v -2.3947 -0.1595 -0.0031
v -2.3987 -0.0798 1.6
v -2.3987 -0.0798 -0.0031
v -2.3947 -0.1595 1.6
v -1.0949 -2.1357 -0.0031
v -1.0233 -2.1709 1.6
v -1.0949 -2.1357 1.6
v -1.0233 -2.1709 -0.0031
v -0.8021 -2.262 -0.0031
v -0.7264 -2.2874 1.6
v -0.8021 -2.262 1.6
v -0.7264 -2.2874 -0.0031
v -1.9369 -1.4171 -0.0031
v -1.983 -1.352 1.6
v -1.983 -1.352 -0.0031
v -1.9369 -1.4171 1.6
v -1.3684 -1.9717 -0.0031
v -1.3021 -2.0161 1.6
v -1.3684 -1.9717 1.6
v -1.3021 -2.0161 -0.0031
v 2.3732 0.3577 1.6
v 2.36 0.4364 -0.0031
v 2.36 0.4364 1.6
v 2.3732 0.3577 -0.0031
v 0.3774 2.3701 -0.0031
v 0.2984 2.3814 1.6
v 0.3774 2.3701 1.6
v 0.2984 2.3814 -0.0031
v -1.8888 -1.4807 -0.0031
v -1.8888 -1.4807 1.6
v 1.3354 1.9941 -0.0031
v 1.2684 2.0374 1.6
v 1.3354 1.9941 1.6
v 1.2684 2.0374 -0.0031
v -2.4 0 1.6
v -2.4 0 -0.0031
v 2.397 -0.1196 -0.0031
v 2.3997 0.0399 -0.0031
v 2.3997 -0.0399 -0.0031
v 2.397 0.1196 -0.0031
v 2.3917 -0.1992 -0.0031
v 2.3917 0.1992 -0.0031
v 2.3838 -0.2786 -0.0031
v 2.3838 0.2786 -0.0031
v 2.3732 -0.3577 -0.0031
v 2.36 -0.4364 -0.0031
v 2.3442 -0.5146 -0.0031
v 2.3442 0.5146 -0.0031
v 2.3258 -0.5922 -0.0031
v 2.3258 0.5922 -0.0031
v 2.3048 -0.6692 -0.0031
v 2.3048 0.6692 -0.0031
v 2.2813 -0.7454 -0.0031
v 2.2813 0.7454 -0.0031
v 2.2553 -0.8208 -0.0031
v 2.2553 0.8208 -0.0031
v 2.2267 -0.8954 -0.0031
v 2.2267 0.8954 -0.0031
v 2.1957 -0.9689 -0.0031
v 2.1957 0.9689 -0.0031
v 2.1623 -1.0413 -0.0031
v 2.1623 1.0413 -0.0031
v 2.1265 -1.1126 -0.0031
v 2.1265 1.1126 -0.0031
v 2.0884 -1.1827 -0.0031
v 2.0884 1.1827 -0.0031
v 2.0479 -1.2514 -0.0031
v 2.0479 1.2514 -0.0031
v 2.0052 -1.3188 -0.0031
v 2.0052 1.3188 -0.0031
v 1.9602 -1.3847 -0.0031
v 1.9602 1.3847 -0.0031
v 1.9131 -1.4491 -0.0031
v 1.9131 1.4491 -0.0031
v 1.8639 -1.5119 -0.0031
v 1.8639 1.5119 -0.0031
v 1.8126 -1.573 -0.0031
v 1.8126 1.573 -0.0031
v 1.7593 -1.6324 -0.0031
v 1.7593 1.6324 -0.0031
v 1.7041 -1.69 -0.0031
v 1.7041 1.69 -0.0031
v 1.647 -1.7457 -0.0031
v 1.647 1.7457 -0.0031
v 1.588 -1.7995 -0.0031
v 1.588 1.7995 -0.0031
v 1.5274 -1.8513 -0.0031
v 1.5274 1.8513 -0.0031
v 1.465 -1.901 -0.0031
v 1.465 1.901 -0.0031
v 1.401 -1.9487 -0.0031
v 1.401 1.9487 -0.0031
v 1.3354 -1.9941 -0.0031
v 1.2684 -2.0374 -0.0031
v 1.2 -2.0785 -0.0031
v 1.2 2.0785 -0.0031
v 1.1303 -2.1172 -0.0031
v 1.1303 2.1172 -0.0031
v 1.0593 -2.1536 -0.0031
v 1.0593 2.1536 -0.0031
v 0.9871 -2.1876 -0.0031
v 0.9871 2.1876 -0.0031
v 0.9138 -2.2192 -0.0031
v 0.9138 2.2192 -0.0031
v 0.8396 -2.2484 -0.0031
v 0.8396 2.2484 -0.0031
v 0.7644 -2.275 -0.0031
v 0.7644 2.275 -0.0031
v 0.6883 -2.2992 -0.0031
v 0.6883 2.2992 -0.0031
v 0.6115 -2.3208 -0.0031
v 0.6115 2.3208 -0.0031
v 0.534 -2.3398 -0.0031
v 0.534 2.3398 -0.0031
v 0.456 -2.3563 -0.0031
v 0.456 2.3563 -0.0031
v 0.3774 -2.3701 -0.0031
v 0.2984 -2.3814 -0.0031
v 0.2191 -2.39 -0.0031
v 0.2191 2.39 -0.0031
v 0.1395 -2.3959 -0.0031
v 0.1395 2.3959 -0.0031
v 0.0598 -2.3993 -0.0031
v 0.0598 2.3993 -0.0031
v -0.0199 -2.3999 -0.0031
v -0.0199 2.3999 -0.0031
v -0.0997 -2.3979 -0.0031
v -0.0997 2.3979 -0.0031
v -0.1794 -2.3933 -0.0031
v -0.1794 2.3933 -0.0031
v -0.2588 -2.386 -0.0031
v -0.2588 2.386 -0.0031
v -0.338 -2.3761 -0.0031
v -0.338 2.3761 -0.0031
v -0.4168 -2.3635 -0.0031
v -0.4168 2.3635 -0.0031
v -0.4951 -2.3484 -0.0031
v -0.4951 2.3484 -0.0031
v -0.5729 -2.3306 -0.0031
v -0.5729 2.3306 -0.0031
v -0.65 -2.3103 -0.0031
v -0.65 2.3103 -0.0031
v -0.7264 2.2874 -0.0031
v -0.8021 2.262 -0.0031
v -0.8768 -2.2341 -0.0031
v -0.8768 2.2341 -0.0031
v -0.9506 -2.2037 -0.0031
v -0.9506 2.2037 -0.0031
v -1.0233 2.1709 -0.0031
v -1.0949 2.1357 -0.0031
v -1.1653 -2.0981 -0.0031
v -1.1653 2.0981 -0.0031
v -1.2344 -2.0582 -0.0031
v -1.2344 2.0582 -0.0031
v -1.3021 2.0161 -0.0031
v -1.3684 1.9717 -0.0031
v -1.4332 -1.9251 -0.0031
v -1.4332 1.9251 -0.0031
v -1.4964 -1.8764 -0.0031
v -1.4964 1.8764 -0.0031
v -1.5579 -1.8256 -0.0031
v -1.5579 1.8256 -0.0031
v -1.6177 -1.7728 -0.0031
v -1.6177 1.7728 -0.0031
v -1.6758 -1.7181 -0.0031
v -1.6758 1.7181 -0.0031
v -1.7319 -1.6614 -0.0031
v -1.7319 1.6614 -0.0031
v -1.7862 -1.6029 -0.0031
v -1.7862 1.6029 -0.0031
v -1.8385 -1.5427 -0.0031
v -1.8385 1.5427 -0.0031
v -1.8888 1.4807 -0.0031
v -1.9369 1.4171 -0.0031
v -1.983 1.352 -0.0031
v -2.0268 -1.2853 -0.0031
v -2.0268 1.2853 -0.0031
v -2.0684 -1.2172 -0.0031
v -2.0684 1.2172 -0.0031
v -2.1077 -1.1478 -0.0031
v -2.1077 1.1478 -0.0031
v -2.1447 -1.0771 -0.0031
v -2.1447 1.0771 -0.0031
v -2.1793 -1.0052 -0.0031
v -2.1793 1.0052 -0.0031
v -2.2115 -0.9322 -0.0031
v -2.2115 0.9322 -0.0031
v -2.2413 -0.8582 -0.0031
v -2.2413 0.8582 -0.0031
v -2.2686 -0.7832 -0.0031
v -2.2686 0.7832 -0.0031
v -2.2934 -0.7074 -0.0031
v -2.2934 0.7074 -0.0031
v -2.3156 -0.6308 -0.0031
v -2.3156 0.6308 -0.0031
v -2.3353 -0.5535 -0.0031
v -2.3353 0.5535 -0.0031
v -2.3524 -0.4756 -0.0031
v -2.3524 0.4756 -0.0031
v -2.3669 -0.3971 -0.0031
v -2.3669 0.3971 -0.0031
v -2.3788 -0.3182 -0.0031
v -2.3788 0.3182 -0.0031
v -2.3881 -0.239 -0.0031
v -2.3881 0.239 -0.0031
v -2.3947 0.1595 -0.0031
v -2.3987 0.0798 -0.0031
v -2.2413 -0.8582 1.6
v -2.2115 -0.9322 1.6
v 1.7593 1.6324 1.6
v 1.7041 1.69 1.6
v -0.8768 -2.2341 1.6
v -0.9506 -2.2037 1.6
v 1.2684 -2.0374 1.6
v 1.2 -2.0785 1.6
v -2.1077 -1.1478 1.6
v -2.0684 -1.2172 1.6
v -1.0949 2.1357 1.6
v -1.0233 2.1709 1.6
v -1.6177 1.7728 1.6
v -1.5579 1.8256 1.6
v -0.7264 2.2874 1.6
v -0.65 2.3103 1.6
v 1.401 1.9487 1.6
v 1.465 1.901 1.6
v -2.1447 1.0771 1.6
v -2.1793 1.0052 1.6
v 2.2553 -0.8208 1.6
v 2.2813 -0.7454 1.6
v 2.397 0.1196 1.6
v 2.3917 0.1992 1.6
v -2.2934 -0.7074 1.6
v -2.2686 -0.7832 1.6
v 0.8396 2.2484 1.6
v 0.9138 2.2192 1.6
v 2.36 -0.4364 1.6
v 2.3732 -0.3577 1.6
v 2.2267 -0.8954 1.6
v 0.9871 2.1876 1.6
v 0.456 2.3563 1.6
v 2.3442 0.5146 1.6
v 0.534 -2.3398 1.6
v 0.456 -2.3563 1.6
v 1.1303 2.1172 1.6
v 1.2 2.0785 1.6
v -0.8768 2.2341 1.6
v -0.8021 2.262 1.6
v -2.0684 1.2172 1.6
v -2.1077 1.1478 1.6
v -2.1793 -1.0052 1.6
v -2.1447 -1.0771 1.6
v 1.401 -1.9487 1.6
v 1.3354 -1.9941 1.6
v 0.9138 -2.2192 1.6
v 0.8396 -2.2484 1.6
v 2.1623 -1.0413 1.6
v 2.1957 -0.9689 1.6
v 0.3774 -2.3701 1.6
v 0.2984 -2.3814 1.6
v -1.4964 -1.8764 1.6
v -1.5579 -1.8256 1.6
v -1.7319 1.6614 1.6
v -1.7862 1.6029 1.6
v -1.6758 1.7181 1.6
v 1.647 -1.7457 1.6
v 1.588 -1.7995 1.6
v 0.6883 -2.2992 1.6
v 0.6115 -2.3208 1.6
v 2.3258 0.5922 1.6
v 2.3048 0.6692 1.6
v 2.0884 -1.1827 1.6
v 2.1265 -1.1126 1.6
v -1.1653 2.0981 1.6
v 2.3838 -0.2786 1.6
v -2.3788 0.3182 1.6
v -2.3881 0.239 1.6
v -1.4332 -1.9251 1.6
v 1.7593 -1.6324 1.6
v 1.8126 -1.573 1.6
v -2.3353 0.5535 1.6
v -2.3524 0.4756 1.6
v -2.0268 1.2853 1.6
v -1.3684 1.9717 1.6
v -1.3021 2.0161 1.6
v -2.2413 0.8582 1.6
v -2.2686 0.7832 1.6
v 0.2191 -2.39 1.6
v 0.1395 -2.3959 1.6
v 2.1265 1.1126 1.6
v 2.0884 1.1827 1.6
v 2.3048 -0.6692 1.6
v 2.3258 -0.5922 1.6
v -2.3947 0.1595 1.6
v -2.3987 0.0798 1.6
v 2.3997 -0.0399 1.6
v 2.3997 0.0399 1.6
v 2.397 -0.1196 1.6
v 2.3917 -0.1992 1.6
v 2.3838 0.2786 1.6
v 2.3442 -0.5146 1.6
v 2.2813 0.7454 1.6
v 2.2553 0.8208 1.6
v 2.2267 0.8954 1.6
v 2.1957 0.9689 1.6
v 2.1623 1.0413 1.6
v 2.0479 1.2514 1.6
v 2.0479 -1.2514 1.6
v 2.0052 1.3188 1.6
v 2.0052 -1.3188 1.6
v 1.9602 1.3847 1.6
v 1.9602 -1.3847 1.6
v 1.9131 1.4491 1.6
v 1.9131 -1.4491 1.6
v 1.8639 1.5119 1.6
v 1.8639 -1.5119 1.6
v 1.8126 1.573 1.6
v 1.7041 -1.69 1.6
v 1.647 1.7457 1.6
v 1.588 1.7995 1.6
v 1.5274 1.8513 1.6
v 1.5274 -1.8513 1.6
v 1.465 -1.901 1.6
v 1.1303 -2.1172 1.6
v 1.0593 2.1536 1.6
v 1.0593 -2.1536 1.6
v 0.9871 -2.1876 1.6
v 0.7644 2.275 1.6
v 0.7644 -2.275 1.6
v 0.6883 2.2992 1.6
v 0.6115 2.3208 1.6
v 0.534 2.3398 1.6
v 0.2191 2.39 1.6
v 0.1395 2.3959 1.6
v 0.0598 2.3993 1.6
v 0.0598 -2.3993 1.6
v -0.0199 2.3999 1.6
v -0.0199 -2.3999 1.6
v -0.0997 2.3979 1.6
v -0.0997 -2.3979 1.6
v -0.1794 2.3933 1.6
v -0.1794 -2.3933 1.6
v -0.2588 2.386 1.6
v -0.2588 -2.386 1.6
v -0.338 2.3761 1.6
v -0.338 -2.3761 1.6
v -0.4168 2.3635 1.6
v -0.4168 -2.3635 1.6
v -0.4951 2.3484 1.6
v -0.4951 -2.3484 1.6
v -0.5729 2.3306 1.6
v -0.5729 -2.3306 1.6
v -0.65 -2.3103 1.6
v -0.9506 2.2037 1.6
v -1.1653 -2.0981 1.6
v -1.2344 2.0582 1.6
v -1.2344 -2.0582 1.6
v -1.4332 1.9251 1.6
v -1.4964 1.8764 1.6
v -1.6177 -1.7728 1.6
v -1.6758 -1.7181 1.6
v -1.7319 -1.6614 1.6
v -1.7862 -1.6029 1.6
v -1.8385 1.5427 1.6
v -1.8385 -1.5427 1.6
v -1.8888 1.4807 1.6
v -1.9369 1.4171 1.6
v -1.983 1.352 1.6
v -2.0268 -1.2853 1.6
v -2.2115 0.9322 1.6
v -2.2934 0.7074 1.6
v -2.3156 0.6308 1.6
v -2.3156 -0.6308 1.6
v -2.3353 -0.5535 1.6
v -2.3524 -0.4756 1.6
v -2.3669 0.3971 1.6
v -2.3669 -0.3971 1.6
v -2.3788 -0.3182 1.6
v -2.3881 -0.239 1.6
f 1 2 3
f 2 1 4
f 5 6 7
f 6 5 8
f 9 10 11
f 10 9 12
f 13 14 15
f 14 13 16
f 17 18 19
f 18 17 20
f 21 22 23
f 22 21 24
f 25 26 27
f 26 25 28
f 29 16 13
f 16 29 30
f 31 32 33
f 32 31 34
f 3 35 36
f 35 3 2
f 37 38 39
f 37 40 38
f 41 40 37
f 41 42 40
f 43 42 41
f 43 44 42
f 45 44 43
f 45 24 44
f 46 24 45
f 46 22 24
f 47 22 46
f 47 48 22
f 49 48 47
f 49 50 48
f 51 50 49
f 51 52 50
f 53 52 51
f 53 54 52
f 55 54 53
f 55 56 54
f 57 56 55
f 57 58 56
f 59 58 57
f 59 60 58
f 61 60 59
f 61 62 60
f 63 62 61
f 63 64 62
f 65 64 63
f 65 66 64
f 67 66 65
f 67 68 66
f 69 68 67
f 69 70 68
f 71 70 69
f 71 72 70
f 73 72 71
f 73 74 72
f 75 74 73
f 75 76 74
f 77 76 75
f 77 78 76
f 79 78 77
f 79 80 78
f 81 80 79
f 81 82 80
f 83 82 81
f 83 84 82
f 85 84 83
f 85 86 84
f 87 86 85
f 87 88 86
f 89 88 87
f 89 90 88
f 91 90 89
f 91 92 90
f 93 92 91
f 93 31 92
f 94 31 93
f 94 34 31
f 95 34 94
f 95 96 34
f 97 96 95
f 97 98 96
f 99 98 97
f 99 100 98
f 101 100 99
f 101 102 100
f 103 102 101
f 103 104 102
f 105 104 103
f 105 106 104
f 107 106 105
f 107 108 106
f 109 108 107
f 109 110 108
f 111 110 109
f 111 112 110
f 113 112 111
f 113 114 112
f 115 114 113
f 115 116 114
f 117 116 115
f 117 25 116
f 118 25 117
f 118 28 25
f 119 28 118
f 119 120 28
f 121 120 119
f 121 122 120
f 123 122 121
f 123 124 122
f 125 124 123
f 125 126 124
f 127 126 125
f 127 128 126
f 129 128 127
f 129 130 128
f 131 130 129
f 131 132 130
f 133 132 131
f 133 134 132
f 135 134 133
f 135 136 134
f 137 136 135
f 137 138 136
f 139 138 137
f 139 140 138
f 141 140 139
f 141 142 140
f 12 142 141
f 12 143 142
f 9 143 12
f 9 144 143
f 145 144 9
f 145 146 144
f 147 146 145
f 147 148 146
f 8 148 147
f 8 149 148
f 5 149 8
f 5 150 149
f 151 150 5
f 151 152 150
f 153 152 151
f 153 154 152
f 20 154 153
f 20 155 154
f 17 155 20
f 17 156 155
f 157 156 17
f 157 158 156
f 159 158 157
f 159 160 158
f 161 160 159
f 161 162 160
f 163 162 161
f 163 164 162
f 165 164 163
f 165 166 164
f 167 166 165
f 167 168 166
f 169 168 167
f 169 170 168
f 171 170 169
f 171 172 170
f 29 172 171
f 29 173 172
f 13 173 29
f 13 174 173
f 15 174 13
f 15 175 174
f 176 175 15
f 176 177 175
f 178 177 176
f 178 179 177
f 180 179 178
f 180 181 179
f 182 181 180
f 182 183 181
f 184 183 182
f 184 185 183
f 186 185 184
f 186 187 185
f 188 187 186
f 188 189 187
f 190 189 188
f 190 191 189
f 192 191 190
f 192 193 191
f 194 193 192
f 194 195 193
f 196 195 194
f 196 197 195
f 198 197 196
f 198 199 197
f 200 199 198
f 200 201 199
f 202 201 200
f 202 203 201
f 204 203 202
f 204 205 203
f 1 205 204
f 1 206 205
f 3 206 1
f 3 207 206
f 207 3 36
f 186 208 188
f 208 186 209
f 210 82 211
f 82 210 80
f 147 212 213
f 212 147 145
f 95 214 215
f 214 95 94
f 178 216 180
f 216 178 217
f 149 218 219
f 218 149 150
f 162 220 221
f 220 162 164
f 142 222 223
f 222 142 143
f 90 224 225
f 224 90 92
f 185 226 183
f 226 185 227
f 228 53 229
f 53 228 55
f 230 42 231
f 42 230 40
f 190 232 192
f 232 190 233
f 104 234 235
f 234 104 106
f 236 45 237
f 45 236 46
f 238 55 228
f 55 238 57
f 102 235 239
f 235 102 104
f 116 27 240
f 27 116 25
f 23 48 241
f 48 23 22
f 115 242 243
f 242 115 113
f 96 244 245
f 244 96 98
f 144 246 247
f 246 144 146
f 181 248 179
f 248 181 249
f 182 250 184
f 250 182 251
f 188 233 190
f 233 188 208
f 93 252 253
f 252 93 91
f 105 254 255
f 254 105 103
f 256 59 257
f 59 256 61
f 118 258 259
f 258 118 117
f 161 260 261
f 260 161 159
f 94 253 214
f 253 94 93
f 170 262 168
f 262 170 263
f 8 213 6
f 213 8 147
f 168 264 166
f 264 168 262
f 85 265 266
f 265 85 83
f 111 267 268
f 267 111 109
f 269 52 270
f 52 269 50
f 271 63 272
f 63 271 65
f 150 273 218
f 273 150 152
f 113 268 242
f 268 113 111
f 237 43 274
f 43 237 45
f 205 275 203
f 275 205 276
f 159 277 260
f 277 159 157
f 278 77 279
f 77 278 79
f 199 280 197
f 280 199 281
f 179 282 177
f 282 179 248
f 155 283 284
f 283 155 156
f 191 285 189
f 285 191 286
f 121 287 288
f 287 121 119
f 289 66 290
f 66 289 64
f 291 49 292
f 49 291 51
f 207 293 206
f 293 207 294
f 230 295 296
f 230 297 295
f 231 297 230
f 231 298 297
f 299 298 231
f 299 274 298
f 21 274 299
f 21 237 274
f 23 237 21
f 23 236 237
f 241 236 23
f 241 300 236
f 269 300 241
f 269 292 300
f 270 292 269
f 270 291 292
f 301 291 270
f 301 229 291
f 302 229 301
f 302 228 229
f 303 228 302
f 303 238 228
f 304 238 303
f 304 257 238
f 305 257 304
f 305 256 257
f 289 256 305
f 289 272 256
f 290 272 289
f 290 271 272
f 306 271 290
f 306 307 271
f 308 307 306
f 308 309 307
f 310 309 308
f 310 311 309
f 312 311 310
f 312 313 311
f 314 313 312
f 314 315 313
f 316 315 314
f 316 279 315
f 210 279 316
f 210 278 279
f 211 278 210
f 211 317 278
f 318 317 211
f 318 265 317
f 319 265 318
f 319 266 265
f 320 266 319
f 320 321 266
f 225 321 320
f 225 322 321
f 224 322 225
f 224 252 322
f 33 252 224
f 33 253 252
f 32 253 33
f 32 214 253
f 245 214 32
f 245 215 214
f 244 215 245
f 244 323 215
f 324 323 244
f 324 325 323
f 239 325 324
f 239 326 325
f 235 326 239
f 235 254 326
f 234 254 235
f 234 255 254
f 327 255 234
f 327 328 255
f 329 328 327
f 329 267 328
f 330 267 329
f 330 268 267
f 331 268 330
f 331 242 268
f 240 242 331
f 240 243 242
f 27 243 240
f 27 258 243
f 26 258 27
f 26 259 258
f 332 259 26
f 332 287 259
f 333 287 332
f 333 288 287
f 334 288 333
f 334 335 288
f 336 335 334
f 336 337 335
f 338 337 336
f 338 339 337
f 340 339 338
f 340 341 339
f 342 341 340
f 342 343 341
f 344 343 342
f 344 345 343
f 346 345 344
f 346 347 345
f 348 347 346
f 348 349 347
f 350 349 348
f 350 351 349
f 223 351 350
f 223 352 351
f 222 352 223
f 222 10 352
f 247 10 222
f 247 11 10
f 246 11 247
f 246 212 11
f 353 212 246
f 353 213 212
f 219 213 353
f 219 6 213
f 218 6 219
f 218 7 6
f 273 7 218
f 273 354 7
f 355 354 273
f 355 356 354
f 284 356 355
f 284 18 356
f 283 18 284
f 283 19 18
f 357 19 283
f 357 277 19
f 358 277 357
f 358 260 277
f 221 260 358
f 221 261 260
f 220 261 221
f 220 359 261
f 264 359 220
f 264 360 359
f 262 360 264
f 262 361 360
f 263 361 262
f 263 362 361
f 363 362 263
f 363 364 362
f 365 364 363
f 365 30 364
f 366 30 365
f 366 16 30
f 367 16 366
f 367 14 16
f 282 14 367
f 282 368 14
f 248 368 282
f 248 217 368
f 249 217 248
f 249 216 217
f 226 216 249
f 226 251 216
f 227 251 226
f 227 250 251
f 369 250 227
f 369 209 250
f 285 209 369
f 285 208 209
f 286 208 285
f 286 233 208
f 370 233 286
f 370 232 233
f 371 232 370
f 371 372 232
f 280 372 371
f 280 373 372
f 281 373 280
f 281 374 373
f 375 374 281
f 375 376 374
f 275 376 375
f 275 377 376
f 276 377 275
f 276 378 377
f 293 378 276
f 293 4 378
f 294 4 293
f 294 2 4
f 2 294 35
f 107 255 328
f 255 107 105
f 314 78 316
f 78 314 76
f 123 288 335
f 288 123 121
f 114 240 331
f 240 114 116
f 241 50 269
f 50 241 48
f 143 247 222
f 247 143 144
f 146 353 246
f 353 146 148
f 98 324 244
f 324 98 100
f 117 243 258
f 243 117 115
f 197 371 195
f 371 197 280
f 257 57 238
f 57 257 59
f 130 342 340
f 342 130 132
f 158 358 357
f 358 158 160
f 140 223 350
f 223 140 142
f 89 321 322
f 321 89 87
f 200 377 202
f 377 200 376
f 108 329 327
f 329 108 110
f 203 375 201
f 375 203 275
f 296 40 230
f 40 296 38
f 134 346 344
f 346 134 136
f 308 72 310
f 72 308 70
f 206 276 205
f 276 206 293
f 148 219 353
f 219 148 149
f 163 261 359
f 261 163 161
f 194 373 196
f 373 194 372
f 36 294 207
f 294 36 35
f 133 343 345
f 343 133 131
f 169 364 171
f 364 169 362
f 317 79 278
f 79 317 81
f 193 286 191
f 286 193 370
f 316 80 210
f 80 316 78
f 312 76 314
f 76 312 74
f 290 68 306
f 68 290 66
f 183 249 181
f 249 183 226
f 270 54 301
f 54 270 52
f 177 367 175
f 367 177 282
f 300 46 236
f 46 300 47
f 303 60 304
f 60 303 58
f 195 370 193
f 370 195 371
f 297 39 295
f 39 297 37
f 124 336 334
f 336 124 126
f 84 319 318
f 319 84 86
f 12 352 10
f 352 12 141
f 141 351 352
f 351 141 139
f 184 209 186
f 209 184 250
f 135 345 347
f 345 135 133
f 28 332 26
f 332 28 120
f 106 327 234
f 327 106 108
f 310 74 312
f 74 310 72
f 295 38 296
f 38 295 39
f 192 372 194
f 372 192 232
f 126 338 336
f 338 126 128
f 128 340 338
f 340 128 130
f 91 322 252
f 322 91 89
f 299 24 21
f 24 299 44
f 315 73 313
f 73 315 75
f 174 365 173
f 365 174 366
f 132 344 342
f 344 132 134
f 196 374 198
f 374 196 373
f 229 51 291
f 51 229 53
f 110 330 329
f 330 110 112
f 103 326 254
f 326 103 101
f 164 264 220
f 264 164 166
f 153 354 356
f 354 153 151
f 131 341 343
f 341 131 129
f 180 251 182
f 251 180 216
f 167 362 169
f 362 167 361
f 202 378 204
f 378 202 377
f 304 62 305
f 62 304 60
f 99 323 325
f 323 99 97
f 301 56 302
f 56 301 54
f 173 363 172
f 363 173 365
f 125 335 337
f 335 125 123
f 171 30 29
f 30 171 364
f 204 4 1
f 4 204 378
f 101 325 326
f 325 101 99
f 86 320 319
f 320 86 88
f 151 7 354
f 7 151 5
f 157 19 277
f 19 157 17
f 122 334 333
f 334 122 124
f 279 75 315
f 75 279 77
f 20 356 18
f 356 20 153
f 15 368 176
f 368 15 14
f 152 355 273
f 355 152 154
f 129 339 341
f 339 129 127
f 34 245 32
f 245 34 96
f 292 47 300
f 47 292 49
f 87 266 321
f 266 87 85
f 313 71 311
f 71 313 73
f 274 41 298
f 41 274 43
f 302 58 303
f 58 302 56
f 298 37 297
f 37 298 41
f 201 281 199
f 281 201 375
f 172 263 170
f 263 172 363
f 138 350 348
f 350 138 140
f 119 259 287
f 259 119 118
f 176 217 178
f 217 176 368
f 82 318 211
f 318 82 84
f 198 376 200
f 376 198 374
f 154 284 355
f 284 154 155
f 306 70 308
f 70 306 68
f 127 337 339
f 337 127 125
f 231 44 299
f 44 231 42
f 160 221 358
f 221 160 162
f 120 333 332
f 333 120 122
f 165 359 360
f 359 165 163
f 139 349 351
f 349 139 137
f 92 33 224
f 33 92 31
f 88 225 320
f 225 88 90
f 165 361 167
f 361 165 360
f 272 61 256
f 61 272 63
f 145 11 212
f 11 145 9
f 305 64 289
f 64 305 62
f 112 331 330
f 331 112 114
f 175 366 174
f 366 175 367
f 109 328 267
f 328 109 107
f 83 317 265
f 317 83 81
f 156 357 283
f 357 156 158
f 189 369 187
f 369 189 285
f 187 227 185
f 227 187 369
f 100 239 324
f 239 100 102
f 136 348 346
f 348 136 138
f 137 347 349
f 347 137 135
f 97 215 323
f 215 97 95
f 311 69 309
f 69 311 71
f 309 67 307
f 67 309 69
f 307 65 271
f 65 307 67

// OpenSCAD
// file: ../p/stud3.scad
use <../lib.scad>
use <4-4cyli.scad>
use <4-4disc.scad>
use <4-4edge.scad>
$fa=1; $fs=0.2;
function ldraw_lib__stud3(realsolid=false) = realsolid ? 
    [openscad(translate([0,0,-eps()], o=cylinder(4+eps(), r=4)),2)] : [
// 0 Stud Tube Solid
// 0 Name: stud3.dat
// 0 Author: James Jessiman
// 0 !LDRAW_ORG Primitive UPDATE 2012-01
// 0 !LICENSE Licensed under CC BY 2.0 and CC BY 4.0 : see CAreadme.txt
// 
// 0 BFC CERTIFY CCW
  [0,"BFC","CERTIFY"],
  [0,"BFC","CCW"],
// 
// 0 !HISTORY 2002-04-04 [sbliss] Modified for BFC compliance
// 0 !HISTORY 2002-04-25 [PTadmin] Official Update 2002-02
// 0 !HISTORY 2007-06-24 [PTadmin] Header formatted for Contributor Agreement
// 0 !HISTORY 2008-07-01 [PTadmin] Official Update 2008-01
// 0 !HISTORY 2012-02-16 [Philo] Changed to CCW
// 0 !HISTORY 2012-03-30 [PTadmin] Official Update 2012-01
// 
// 
// 1 16 0 -4 0 4 0 0 0 1 0 0 0 4 4-4edge.dat
  [1,16,0,-4,0,4,0,0,0,1,0,0,0,4, ldraw_lib__4_4edge(realsolid)],
// 1 16 0 0 0 4 0 0 0 1 0 0 0 4 4-4edge.dat
  [1,16,0,0,0,4,0,0,0,1,0,0,0,4, ldraw_lib__4_4edge(realsolid)],
// 1 16 0 -4 0 4 0 0 0 1 0 0 0 4 4-4disc.dat
  [1,16,0,-4,0,4,0,0,0,1,0,0,0,4, ldraw_lib__4_4disc(realsolid)],
// 1 16 0 -4 0 4 0 0 0 4 0 0 0 4 4-4cyli.dat
  [1,16,0,-4,0,4,0,0,0,4,0,0,0,4, ldraw_lib__4_4cyli(realsolid)],
];
module ldraw_lib__stud3(step=0, col=false, unit=2/5, alt=false, line=0.2, solid=!$preview)
    makepoly(ldraw_lib__stud3(solid), step=step, col=col, unit=unit, alt=alt, line=line, solid=solid);
ldraw_lib__stud3(line=0.2);
// file: ../p/4-4edge.scad
use <../lib.scad>
$fa=1; $fs=0.2;
function ldraw_lib__4_4edge(realsolid=false) = [
// 0 Circle 1.0
// 0 Name: 4-4edge.dat
// 0 Author: James Jessiman
// 0 !LDRAW_ORG Primitive UPDATE 2017-01
// 0 !LICENSE Licensed under CC BY 2.0 and CC BY 4.0 : see CAreadme.txt
// 
// 0 BFC CERTIFY CCW
  [0,"BFC","CERTIFY"],
  [0,"BFC","CCW"],
// 
// 0 !HISTORY 1998-12-15 [PTadmin] Official Update 1998-10
// 0 !HISTORY 2005-12-28 [PTadmin] Official Update 2005-01
// 0 !HISTORY 2007-06-24 [PTadmin] Header formatted for Contributor Agreement
// 0 !HISTORY 2008-07-01 [PTadmin] Official Update 2008-01
// 0 !HISTORY 2017-01-15 [Steffen] BFCed
// 0 !HISTORY 2017-12-30 [PTadmin] Official Update 2017-01
// 
// 
// 2 24 1 0 0 0.9239 0 0.3827
  [2,24,1,0,0,0.9239,0,0.3827],
// 2 24 0.9239 0 0.3827 0.7071 0 0.7071
  [2,24,0.9239,0,0.3827,0.7071,0,0.7071],
// 2 24 0.7071 0 0.7071 0.3827 0 0.9239
  [2,24,0.7071,0,0.7071,0.3827,0,0.9239],
// 2 24 0.3827 0 0.9239 0 0 1
  [2,24,0.3827,0,0.9239,0,0,1],
// 2 24 0 0 1 -0.3827 0 0.9239
  [2,24,0,0,1,-0.3827,0,0.9239],
// 2 24 -0.3827 0 0.9239 -0.7071 0 0.7071
  [2,24,-0.3827,0,0.9239,-0.7071,0,0.7071],
// 2 24 -0.7071 0 0.7071 -0.9239 0 0.3827
  [2,24,-0.7071,0,0.7071,-0.9239,0,0.3827],
// 2 24 -0.9239 0 0.3827 -1 0 -0
  [2,24,-0.9239,0,0.3827,-1,0,-0],
// 2 24 -1 0 -0 -0.9239 0 -0.3827
  [2,24,-1,0,-0,-0.9239,0,-0.3827],
// 2 24 -0.9239 0 -0.3827 -0.7071 0 -0.7071
  [2,24,-0.9239,0,-0.3827,-0.7071,0,-0.7071],
// 2 24 -0.7071 0 -0.7071 -0.3827 0 -0.9239
  [2,24,-0.7071,0,-0.7071,-0.3827,0,-0.9239],
// 2 24 -0.3827 0 -0.9239 0 0 -1
  [2,24,-0.3827,0,-0.9239,0,0,-1],
// 2 24 0 0 -1 0.3827 0 -0.9239
  [2,24,0,0,-1,0.3827,0,-0.9239],
// 2 24 0.3827 0 -0.9239 0.7071 0 -0.7071
  [2,24,0.3827,0,-0.9239,0.7071,0,-0.7071],
// 2 24 0.7071 0 -0.7071 0.9239 0 -0.3827
  [2,24,0.7071,0,-0.7071,0.9239,0,-0.3827],
// 2 24 0.9239 0 -0.3827 1 0 0
  [2,24,0.9239,0,-0.3827,1,0,0],
];
module ldraw_lib__4_4edge(step=0, col=false, unit=2/5, alt=false, line=0.2, solid=!$preview)
    makepoly(ldraw_lib__4_4edge(solid), step=step, col=col, unit=unit, alt=alt, line=line, solid=solid);
ldraw_lib__4_4edge(line=0.2);
// file: ../p/4-4disc.scad
use <../lib.scad>
$fa=1; $fs=0.2;
function ldraw_lib__4_4disc(realsolid=false) = [
// 0 Disc 1.0
// 0 Name: 4-4disc.dat
// 0 Author: James Jessiman
// 0 !LDRAW_ORG Primitive UPDATE 2002-02
// 0 !LICENSE Licensed under CC BY 2.0 and CC BY 4.0 : see CAreadme.txt
// 
// 0 BFC CERTIFY CCW
  [0,"BFC","CERTIFY"],
  [0,"BFC","CCW"],
// 
// 0 !HISTORY 1998-12-15 [PTadmin] Official Update 1998-10
// 0 !HISTORY 2002-03-23 [sbliss] Added BFC statement
// 0 !HISTORY 2002-04-25 [PTadmin] Official Update 2002-02
// 0 !HISTORY 2007-06-24 [PTadmin] Header formatted for Contributor Agreement
// 0 !HISTORY 2008-07-01 [PTadmin] Official Update 2008-01
// 
// 
// 3 16 0 0 0 1 0 0 0.9239 0 0.3827
  [3,16,0,0,0,1,0,0,0.9239,0,0.3827],
// 3 16 0 0 0 0.9239 0 0.3827 0.7071 0 0.7071
  [3,16,0,0,0,0.9239,0,0.3827,0.7071,0,0.7071],
// 3 16 0 0 0 0.7071 0 0.7071 0.3827 0 0.9239
  [3,16,0,0,0,0.7071,0,0.7071,0.3827,0,0.9239],
// 3 16 0 0 0 0.3827 0 0.9239 0 0 1
  [3,16,0,0,0,0.3827,0,0.9239,0,0,1],
// 3 16 0 0 0 0 0 1 -0.3827 0 0.9239
  [3,16,0,0,0,0,0,1,-0.3827,0,0.9239],
// 3 16 0 0 0 -0.3827 0 0.9239 -0.7071 0 0.7071
  [3,16,0,0,0,-0.3827,0,0.9239,-0.7071,0,0.7071],
// 3 16 0 0 0 -0.7071 0 0.7071 -0.9239 0 0.3827
  [3,16,0,0,0,-0.7071,0,0.7071,-0.9239,0,0.3827],
// 3 16 0 0 0 -0.9239 0 0.3827 -1 0 -0
  [3,16,0,0,0,-0.9239,0,0.3827,-1,0,-0],
// 3 16 0 0 0 -1 0 -0 -0.9239 0 -0.3827
  [3,16,0,0,0,-1,0,-0,-0.9239,0,-0.3827],
// 3 16 0 0 0 -0.9239 0 -0.3827 -0.7071 0 -0.7071
  [3,16,0,0,0,-0.9239,0,-0.3827,-0.7071,0,-0.7071],
// 3 16 0 0 0 -0.7071 0 -0.7071 -0.3827 0 -0.9239
  [3,16,0,0,0,-0.7071,0,-0.7071,-0.3827,0,-0.9239],
// 3 16 0 0 0 -0.3827 0 -0.9239 0 0 -1
  [3,16,0,0,0,-0.3827,0,-0.9239,0,0,-1],
// 3 16 0 0 0 0 0 -1 0.3827 0 -0.9239
  [3,16,0,0,0,0,0,-1,0.3827,0,-0.9239],
// 3 16 0 0 0 0.3827 0 -0.9239 0.7071 0 -0.7071
  [3,16,0,0,0,0.3827,0,-0.9239,0.7071,0,-0.7071],
// 3 16 0 0 0 0.7071 0 -0.7071 0.9239 0 -0.3827
  [3,16,0,0,0,0.7071,0,-0.7071,0.9239,0,-0.3827],
// 3 16 0 0 0 0.9239 0 -0.3827 1 0 0
  [3,16,0,0,0,0.9239,0,-0.3827,1,0,0],
// 0
];
module ldraw_lib__4_4disc(step=0, col=false, unit=2/5, alt=false, line=0.2, solid=!$preview)
    makepoly(ldraw_lib__4_4disc(solid), step=step, col=col, unit=unit, alt=alt, line=line, solid=solid);
ldraw_lib__4_4disc(line=0.2);
// file: ../p/4-4cyli.scad
use <../lib.scad>
$fa=1; $fs=0.2;
function ldraw_lib__4_4cyli(realsolid=false) = [
// 0 Cylinder 1.0
// 0 Name: 4-4cyli.dat
// 0 Author: James Jessiman
// 0 !LDRAW_ORG Primitive UPDATE 2005-01
// 0 !LICENSE Licensed under CC BY 2.0 and CC BY 4.0 : see CAreadme.txt
// 
// 0 BFC CERTIFY CCW
  [0,"BFC","CERTIFY"],
  [0,"BFC","CCW"],
// 
// 0 !HISTORY 1998-12-15 [PTadmin] Official Update 1998-10
// 0 !HISTORY 2002-03-23 [sbliss] Added BFC statement; merged headers from files in distributions LDraw 0.27 and Complete.
// 0 !HISTORY 2002-04-25 [PTadmin] Official Update 2002-02
// 0 !HISTORY 2004-12-14 [guyvivan] BFC CCW
// 0 !HISTORY 2005-12-28 [PTadmin] Official Update 2005-01
// 0 !HISTORY 2007-06-24 [PTadmin] Header formatted for Contributor Agreement
// 0 !HISTORY 2008-07-01 [PTadmin] Official Update 2008-01
// 
// 
// 4 16 1 1 0 0.9239 1 0.3827 0.9239 0 0.3827 1 0 0
  [4,16,1,1,0,0.9239,1,0.3827,0.9239,0,0.3827,1,0,0],
// 5 24 1 0 0 1 1 0 0.9239 0 0.3827 0.9239 0 -0.3827
  [5,24,1,0,0,1,1,0,0.9239,0,0.3827,0.9239,0,-0.3827],
// 4 16 0.9239 1 0.3827 0.7071 1 0.7071 0.7071 0 0.7071 0.9239 0 0.3827
  [4,16,0.9239,1,0.3827,0.7071,1,0.7071,0.7071,0,0.7071,0.9239,0,0.3827],
// 5 24 0.9239 0 0.3827 0.9239 1 0.3827 0.7071 0 0.7071 1 0 0
  [5,24,0.9239,0,0.3827,0.9239,1,0.3827,0.7071,0,0.7071,1,0,0],
// 4 16 0.7071 1 0.7071 0.3827 1 0.9239 0.3827 0 0.9239 0.7071 0 0.7071
  [4,16,0.7071,1,0.7071,0.3827,1,0.9239,0.3827,0,0.9239,0.7071,0,0.7071],
// 5 24 0.7071 0 0.7071 0.7071 1 0.7071 0.3827 0 0.9239 0.9239 0 0.3827
  [5,24,0.7071,0,0.7071,0.7071,1,0.7071,0.3827,0,0.9239,0.9239,0,0.3827],
// 4 16 0.3827 1 0.9239 0 1 1 0 0 1 0.3827 0 0.9239
  [4,16,0.3827,1,0.9239,0,1,1,0,0,1,0.3827,0,0.9239],
// 5 24 0.3827 0 0.9239 0.3827 1 0.9239 0 0 1 0.7071 0 0.7071
  [5,24,0.3827,0,0.9239,0.3827,1,0.9239,0,0,1,0.7071,0,0.7071],
// 4 16 0 1 1 -0.3827 1 0.9239 -0.3827 0 0.9239 0 0 1
  [4,16,0,1,1,-0.3827,1,0.9239,-0.3827,0,0.9239,0,0,1],
// 5 24 0 0 1 0 1 1 -0.3827 0 0.9239 0.3827 0 0.9239
  [5,24,0,0,1,0,1,1,-0.3827,0,0.9239,0.3827,0,0.9239],
// 4 16 -0.3827 1 0.9239 -0.7071 1 0.7071 -0.7071 0 0.7071 -0.3827 0 0.9239
  [4,16,-0.3827,1,0.9239,-0.7071,1,0.7071,-0.7071,0,0.7071,-0.3827,0,0.9239],
// 5 24 -0.3827 0 0.9239 -0.3827 1 0.9239 -0.7071 0 0.7071 0 0 1
  [5,24,-0.3827,0,0.9239,-0.3827,1,0.9239,-0.7071,0,0.7071,0,0,1],
// 4 16 -0.7071 1 0.7071 -0.9239 1 0.3827 -0.9239 0 0.3827 -0.7071 0 0.7071
  [4,16,-0.7071,1,0.7071,-0.9239,1,0.3827,-0.9239,0,0.3827,-0.7071,0,0.7071],
// 5 24 -0.7071 0 0.7071 -0.7071 1 0.7071 -0.9239 0 0.3827 -0.3827 0 0.9239
  [5,24,-0.7071,0,0.7071,-0.7071,1,0.7071,-0.9239,0,0.3827,-0.3827,0,0.9239],
// 4 16 -0.9239 1 0.3827 -1 1 0 -1 0 0 -0.9239 0 0.3827
  [4,16,-0.9239,1,0.3827,-1,1,0,-1,0,0,-0.9239,0,0.3827],
// 5 24 -0.9239 0 0.3827 -0.9239 1 0.3827 -1 0 0 -0.7071 0 0.7071
  [5,24,-0.9239,0,0.3827,-0.9239,1,0.3827,-1,0,0,-0.7071,0,0.7071],
// 4 16 -1 1 0 -0.9239 1 -0.3827 -0.9239 0 -0.3827 -1 0 0
  [4,16,-1,1,0,-0.9239,1,-0.3827,-0.9239,0,-0.3827,-1,0,0],
// 5 24 -1 0 0 -1 1 0 -0.9239 0 -0.3827 -0.9239 0 0.3827
  [5,24,-1,0,0,-1,1,0,-0.9239,0,-0.3827,-0.9239,0,0.3827],
// 4 16 -0.9239 1 -0.3827 -0.7071 1 -0.7071 -0.7071 0 -0.7071 -0.9239 0 -0.3827
  [4,16,-0.9239,1,-0.3827,-0.7071,1,-0.7071,-0.7071,0,-0.7071,-0.9239,0,-0.3827],
// 5 24 -0.9239 0 -0.3827 -0.9239 1 -0.3827 -0.7071 0 -0.7071 -1 0 0
  [5,24,-0.9239,0,-0.3827,-0.9239,1,-0.3827,-0.7071,0,-0.7071,-1,0,0],
// 4 16 -0.7071 1 -0.7071 -0.3827 1 -0.9239 -0.3827 0 -0.9239 -0.7071 0 -0.7071
  [4,16,-0.7071,1,-0.7071,-0.3827,1,-0.9239,-0.3827,0,-0.9239,-0.7071,0,-0.7071],
// 5 24 -0.7071 0 -0.7071 -0.7071 1 -0.7071 -0.3827 0 -0.9239 -0.9239 0 -0.3827
  [5,24,-0.7071,0,-0.7071,-0.7071,1,-0.7071,-0.3827,0,-0.9239,-0.9239,0,-0.3827],
// 4 16 -0.3827 1 -0.9239 0 1 -1 0 0 -1 -0.3827 0 -0.9239
  [4,16,-0.3827,1,-0.9239,0,1,-1,0,0,-1,-0.3827,0,-0.9239],
// 5 24 -0.3827 0 -0.9239 -0.3827 1 -0.9239 0 0 -1 -0.7071 0 -0.7071
  [5,24,-0.3827,0,-0.9239,-0.3827,1,-0.9239,0,0,-1,-0.7071,0,-0.7071],
// 4 16 0 1 -1 0.3827 1 -0.9239 0.3827 0 -0.9239 0 0 -1
  [4,16,0,1,-1,0.3827,1,-0.9239,0.3827,0,-0.9239,0,0,-1],
// 5 24 0 0 -1 0 1 -1 0.3827 0 -0.9239 -0.3827 0 -0.9239
  [5,24,0,0,-1,0,1,-1,0.3827,0,-0.9239,-0.3827,0,-0.9239],
// 4 16 0.3827 1 -0.9239 0.7071 1 -0.7071 0.7071 0 -0.7071 0.3827 0 -0.9239
  [4,16,0.3827,1,-0.9239,0.7071,1,-0.7071,0.7071,0,-0.7071,0.3827,0,-0.9239],
// 5 24 0.3827 0 -0.9239 0.3827 1 -0.9239 0.7071 0 -0.7071 0 0 -1
  [5,24,0.3827,0,-0.9239,0.3827,1,-0.9239,0.7071,0,-0.7071,0,0,-1],
// 4 16 0.7071 1 -0.7071 0.9239 1 -0.3827 0.9239 0 -0.3827 0.7071 0 -0.7071
  [4,16,0.7071,1,-0.7071,0.9239,1,-0.3827,0.9239,0,-0.3827,0.7071,0,-0.7071],
// 5 24 0.7071 0 -0.7071 0.7071 1 -0.7071 0.9239 0 -0.3827 0.3827 0 -0.9239
  [5,24,0.7071,0,-0.7071,0.7071,1,-0.7071,0.9239,0,-0.3827,0.3827,0,-0.9239],
// 4 16 0.9239 1 -0.3827 1 1 0 1 0 0 0.9239 0 -0.3827
  [4,16,0.9239,1,-0.3827,1,1,0,1,0,0,0.9239,0,-0.3827],
// 5 24 0.9239 0 -0.3827 0.9239 1 -0.3827 1 0 0 0.7071 0 -0.7071
  [5,24,0.9239,0,-0.3827,0.9239,1,-0.3827,1,0,0,0.7071,0,-0.7071],
// 0
];
module ldraw_lib__4_4cyli(step=0, col=false, unit=2/5, alt=false, line=0.2, solid=!$preview)
    makepoly(ldraw_lib__4_4cyli(solid), step=step, col=col, unit=unit, alt=alt, line=line, solid=solid);
ldraw_lib__4_4cyli(line=0.2);
// file: s/3004s01.scad
use <../../lib.scad>
use <../../p/box4t.scad>
use <../../p/box5.scad>
use <../../p/stud.scad>
use <../../p/stud3.scad>
$fa=1; $fs=0.2;
function ldraw_lib__s__3004s01(realsolid=false) = [
// 0 ~Brick  1 x  2 without Front Face
// 0 Name: s\3004s01.dat
// 0 Author: James Jessiman
// 0 !LDRAW_ORG Subpart UPDATE 2003-03
// 0 !LICENSE Licensed under CC BY 2.0 and CC BY 4.0 : see CAreadme.txt
// 
// 0 BFC CERTIFY CCW
  [0,"BFC","CERTIFY"],
  [0,"BFC","CCW"],
// 
// 0 !HISTORY 2003-09-07 [jriley] Subfiling, BFC
// 0 !HISTORY 2003-12-19 [PTadmin] Official Update 2003-03
// 0 !HISTORY 2007-08-29 [PTadmin] Header formatted for Contributor Agreement
// 0 !HISTORY 2008-07-01 [PTadmin] Official Update 2008-01
// 
// 
// 1 16 0 4 0 1 0 0 0 -5 0 0 0 1 stud3.dat
  [1,16,0,4,0,1,0,0,0,-5,0,0,0,1, ldraw_lib__stud3(realsolid)],
// 0 BFC INVERTNEXT
  [0,"BFC","INVERTNEXT"],
// 1 16 0 24 0 16 0 0 0 -20 0 0 0 6 box5.dat
  [1,16,0,24,0,16,0,0,0,-20,0,0,0,6, ldraw_lib__box5(realsolid)],
// 4 16 20 24 10 16 24 6 -16 24 6 -20 24 10
  [4,16,20,24,10,16,24,6,-16,24,6,-20,24,10],
// 4 16 -20 24 10 -16 24 6 -16 24 -6 -20 24 -10
  [4,16,-20,24,10,-16,24,6,-16,24,-6,-20,24,-10],
// 4 16 -20 24 -10 -16 24 -6 16 24 -6 20 24 -10
  [4,16,-20,24,-10,-16,24,-6,16,24,-6,20,24,-10],
// 4 16 20 24 -10 16 24 -6 16 24 6 20 24 10
  [4,16,20,24,-10,16,24,-6,16,24,6,20,24,10],
// 1 16 0 24 0 20 0 0 0 -24 0 0 0 10 box4t.dat
  [1,16,0,24,0,20,0,0,0,-24,0,0,0,10, ldraw_lib__box4t(realsolid)],
// 1 16 10 0 0 1 0 0 0 1 0 0 0 1 stud.dat
  [1,16,10,0,0,1,0,0,0,1,0,0,0,1, ldraw_lib__stud(realsolid)],
// 1 16 -10 0 0 1 0 0 0 1 0 0 0 1 stud.dat
  [1,16,-10,0,0,1,0,0,0,1,0,0,0,1, ldraw_lib__stud(realsolid)],
// 0
];
module ldraw_lib__s__3004s01(step=0, col=false, unit=2/5, alt=false, line=0.2, solid=!$preview)
    makepoly(ldraw_lib__s__3004s01(solid), step=step, col=col, unit=unit, alt=alt, line=line, solid=solid);
ldraw_lib__s__3004s01(line=0.2);
// file: ../p/stud.scad
use <../lib.scad>
use <4-4cyli.scad>
use <4-4disc.scad>
use <4-4edge.scad>
$fa=1; $fs=0.2;
function ldraw_lib__stud(realsolid=false) = realsolid ? 
    [openscad(translate([0,0,-eps()], o=cylinder(4+eps(), r=6)),2)] : [
// 0 Stud
// 0 Name: stud.dat
// 0 Author: James Jessiman
// 0 !LDRAW_ORG Primitive UPDATE 2012-01
// 0 !LICENSE Licensed under CC BY 2.0 and CC BY 4.0 : see CAreadme.txt
// 
// 0 BFC CERTIFY CCW
  [0,"BFC","CERTIFY"],
  [0,"BFC","CCW"],
// 
// 0 !HISTORY 2002-04-04 [sbliss] Modified for BFC compliance
// 0 !HISTORY 2002-04-25 [PTadmin] Official Update 2002-02
// 0 !HISTORY 2007-06-24 [PTadmin] Header formatted for Contributor Agreement
// 0 !HISTORY 2008-07-01 [PTadmin] Official Update 2008-01
// 0 !HISTORY 2012-02-16 [Philo] Changed to CCW
// 0 !HISTORY 2012-03-30 [PTadmin] Official Update 2012-01
// 
// 
// 1 16 0 0 0 6 0 0 0 1 0 0 0 6 4-4edge.dat
  [1,16,0,0,0,6,0,0,0,1,0,0,0,6, ldraw_lib__4_4edge(realsolid)],
// 1 16 0 -4 0 6 0 0 0 1 0 0 0 6 4-4edge.dat
  [1,16,0,-4,0,6,0,0,0,1,0,0,0,6, ldraw_lib__4_4edge(realsolid)],
// 1 16 0 0 0 6 0 0 0 -4 0 0 0 6 4-4cyli.dat
  [1,16,0,0,0,6,0,0,0,-4,0,0,0,6, ldraw_lib__4_4cyli(realsolid)],
// 1 16 0 -4 0 6 0 0 0 1 0 0 0 6 4-4disc.dat
  [1,16,0,-4,0,6,0,0,0,1,0,0,0,6, ldraw_lib__4_4disc(realsolid)],
];
module ldraw_lib__stud(step=0, col=false, unit=2/5, alt=false, line=0.2, solid=!$preview)
    makepoly(ldraw_lib__stud(solid), step=step, col=col, unit=unit, alt=alt, line=line, solid=solid);
ldraw_lib__stud(line=0.2);
// file: ../p/box5.scad
use <../lib.scad>
$fa=1; $fs=0.2;
function ldraw_lib__box5(realsolid=false) = [
// 0 Box with 5 Faces and All Edges
// 0 Name: box5.dat
// 0 Author: James Jessiman
// 0 !LDRAW_ORG Primitive UPDATE 2012-01
// 0 !LICENSE Licensed under CC BY 2.0 and CC BY 4.0 : see CAreadme.txt
// 
// 0 BFC CERTIFY CCW
  [0,"BFC","CERTIFY"],
  [0,"BFC","CCW"],
// 
// 0 !HISTORY 2002-04-03 [sbliss] Modified for BFC compliance
// 0 !HISTORY 2002-04-25 [PTadmin] Official Update 2002-02
// 0 !HISTORY 2007-06-24 [PTadmin] Header formatted for Contributor Agreement
// 0 !HISTORY 2008-07-01 [PTadmin] Official Update 2008-01
// 0 !HISTORY 2012-02-16 [Philo] Changed to CCW
// 0 !HISTORY 2012-03-30 [PTadmin] Official Update 2012-01
// 
// 
// 2 24 1 1 1 -1 1 1
  [2,24,1,1,1,-1,1,1],
// 2 24 -1 1 1 -1 1 -1
  [2,24,-1,1,1,-1,1,-1],
// 2 24 -1 1 -1 1 1 -1
  [2,24,-1,1,-1,1,1,-1],
// 2 24 1 1 -1 1 1 1
  [2,24,1,1,-1,1,1,1],
// 2 24 1 0 1 -1 0 1
  [2,24,1,0,1,-1,0,1],
// 2 24 -1 0 1 -1 0 -1
  [2,24,-1,0,1,-1,0,-1],
// 2 24 -1 0 -1 1 0 -1
  [2,24,-1,0,-1,1,0,-1],
// 2 24 1 0 -1 1 0 1
  [2,24,1,0,-1,1,0,1],
// 2 24 1 0 1 1 1 1
  [2,24,1,0,1,1,1,1],
// 2 24 -1 0 1 -1 1 1
  [2,24,-1,0,1,-1,1,1],
// 2 24 1 0 -1 1 1 -1
  [2,24,1,0,-1,1,1,-1],
// 2 24 -1 0 -1 -1 1 -1
  [2,24,-1,0,-1,-1,1,-1],
// 4 16 -1 1 1 1 1 1 1 1 -1 -1 1 -1
  [4,16,-1,1,1,1,1,1,1,1,-1,-1,1,-1],
// 4 16 -1 1 1 -1 0 1 1 0 1 1 1 1
  [4,16,-1,1,1,-1,0,1,1,0,1,1,1,1],
// 4 16 -1 1 -1 -1 0 -1 -1 0 1 -1 1 1
  [4,16,-1,1,-1,-1,0,-1,-1,0,1,-1,1,1],
// 4 16 1 1 -1 1 0 -1 -1 0 -1 -1 1 -1
  [4,16,1,1,-1,1,0,-1,-1,0,-1,-1,1,-1],
// 4 16 1 1 1 1 0 1 1 0 -1 1 1 -1
  [4,16,1,1,1,1,0,1,1,0,-1,1,1,-1],
];
module ldraw_lib__box5(step=0, col=false, unit=2/5, alt=false, line=0.2, solid=!$preview)
    makepoly(ldraw_lib__box5(solid), step=step, col=col, unit=unit, alt=alt, line=line, solid=solid);
ldraw_lib__box5(line=0.2);
// file: ../p/box4t.scad
use <../lib.scad>
$fa=1; $fs=0.2;
function ldraw_lib__box4t(realsolid=false) = [
// 0 Box with 4 Adjacent Faces and All Edges
// 0 Name: box4t.dat
// 0 Author: Tore Eriksson [Tore_Eriksson]
// 0 !LDRAW_ORG Primitive UPDATE 2003-02
// 0 !LICENSE Licensed under CC BY 2.0 and CC BY 4.0 : see CAreadme.txt
// 
// 0 BFC CERTIFY CCW
  [0,"BFC","CERTIFY"],
  [0,"BFC","CCW"],
// 
// 0 !HISTORY 1997-09-29 [PTadmin] Official Update 1997-15
// 0 !HISTORY 2002-08-31 [izanette] Modified with WINDZ for BFC compliance
// 0 !HISTORY 2003-08-01 [PTadmin] Official Update 2003-02
// 0 !HISTORY 2007-06-24 [PTadmin] Header formatted for Contributor Agreement
// 0 !HISTORY 2008-07-01 [PTadmin] Official Update 2008-01
// 
// 
// 2 24 1 1 1 -1 1 1
  [2,24,1,1,1,-1,1,1],
// 2 24 -1 1 1 -1 1 -1
  [2,24,-1,1,1,-1,1,-1],
// 2 24 -1 1 -1 1 1 -1
  [2,24,-1,1,-1,1,1,-1],
// 2 24 1 1 -1 1 1 1
  [2,24,1,1,-1,1,1,1],
// 2 24 1 0 1 -1 0 1
  [2,24,1,0,1,-1,0,1],
// 2 24 -1 0 1 -1 0 -1
  [2,24,-1,0,1,-1,0,-1],
// 2 24 -1 0 -1 1 0 -1
  [2,24,-1,0,-1,1,0,-1],
// 2 24 1 0 -1 1 0 1
  [2,24,1,0,-1,1,0,1],
// 2 24 1 0 1 1 1 1
  [2,24,1,0,1,1,1,1],
// 2 24 -1 0 1 -1 1 1
  [2,24,-1,0,1,-1,1,1],
// 2 24 1 0 -1 1 1 -1
  [2,24,1,0,-1,1,1,-1],
// 2 24 -1 0 -1 -1 1 -1
  [2,24,-1,0,-1,-1,1,-1],
// 4 16 1 1 1 1 1 -1 -1 1 -1 -1 1 1
  [4,16,1,1,1,1,1,-1,-1,1,-1,-1,1,1],
// 4 16 1 1 1 -1 1 1 -1 0 1 1 0 1
  [4,16,1,1,1,-1,1,1,-1,0,1,1,0,1],
// 4 16 -1 1 1 -1 1 -1 -1 0 -1 -1 0 1
  [4,16,-1,1,1,-1,1,-1,-1,0,-1,-1,0,1],
// 0 4 16 -1 1 -1 -1 0 -1 1 0 -1 1 1 -1
// 4 16 1 1 -1 1 1 1 1 0 1 1 0 -1
  [4,16,1,1,-1,1,1,1,1,0,1,1,0,-1],
// 0
];
module ldraw_lib__box4t(step=0, col=false, unit=2/5, alt=false, line=0.2, solid=!$preview)
    makepoly(ldraw_lib__box4t(solid), step=step, col=col, unit=unit, alt=alt, line=line, solid=solid);
ldraw_lib__box4t(line=0.2);
// file: 3004.scad
use <../lib.scad>
use <s/3004s01.scad>
$fa=1; $fs=0.2;
function ldraw_lib__3004(realsolid=false) = [
// 0 Brick  1 x  2
// 0 Name: 3004.dat
// 0 Author: James Jessiman
// 0 !LDRAW_ORG Part UPDATE 2022-05
// 0 !LICENSE Licensed under CC BY 2.0 and CC BY 4.0 : see CAreadme.txt
// 
// 0 BFC CERTIFY CCW
  [0,"BFC","CERTIFY"],
  [0,"BFC","CCW"],
// 
// 0 !HISTORY 2001-10-26 [PTadmin] Official Update 2001-01
// 0 !HISTORY 2002-05-07 {unknown} BFC Certification
// 0 !HISTORY 2002-06-11 [PTadmin] Official Update 2002-03
// 0 !HISTORY 2007-05-07 [PTadmin] Header formatted for Contributor Agreement
// 0 !HISTORY 2008-07-01 [PTadmin] Official Update 2008-01
// 0 !HISTORY 2022-08-04 [MagFors] Using subfile
// 0 !HISTORY 2022-09-15 [PTadmin] Official Update 2022-05
// 
// 
// 1 16 0 0 0 1 0 0 0 1 0 0 0 1 s\3004s01.dat
  [1,16,0,0,0,1,0,0,0,1,0,0,0,1, ldraw_lib__s__3004s01(realsolid)],
// 4 16 -20 24 -10 20 24 -10 20 0 -10 -20 0 -10
  [4,16,-20,24,-10,20,24,-10,20,0,-10,-20,0,-10],
];
module ldraw_lib__3004(step=0, col=false, unit=2/5, alt=false, line=0.2, solid=!$preview)
    makepoly(ldraw_lib__3004(solid), step=step, col=col, unit=unit, alt=alt, line=line, solid=solid);
ldraw_lib__3004(line=0.2);
// file: s/3005s01.scad
use <../../lib.scad>
use <../../p/box4t.scad>
use <../../p/box5.scad>
use <../../p/stud.scad>
$fa=1; $fs=0.2;
function ldraw_lib__s__3005s01(realsolid=false) = [
// 0 ~Brick  1 x  1 without Front Face
// 0 Name: s\3005s01.dat
// 0 Author: John Riley [jriley]
// 0 !LDRAW_ORG Subpart UPDATE 2004-01
// 0 !LICENSE Licensed under CC BY 2.0 and CC BY 4.0 : see CAreadme.txt
// 
// 0 BFC CERTIFY CCW
  [0,"BFC","CERTIFY"],
  [0,"BFC","CCW"],
// 
// 0 !HISTORY 2003-09-07 [jriley] BFCed & Subfiled
// 0 !HISTORY 2004-03-02 [PTadmin] Official Update 2004-01
// 0 !HISTORY 2007-08-29 [PTadmin] Header formatted for Contributor Agreement
// 0 !HISTORY 2008-07-01 [PTadmin] Official Update 2008-01
// 
// 
// 0 BFC INVERTNEXT
  [0,"BFC","INVERTNEXT"],
// 1 16 0 24 0 0 0 6 0 -20 0 -6 0 0 box5.dat
  [1,16,0,24,0,0,0,6,0,-20,0,-6,0,0, ldraw_lib__box5(realsolid)],
// 4 16 10 24 -10 6 24 -6 6 24 6 10 24 10
  [4,16,10,24,-10,6,24,-6,6,24,6,10,24,10],
// 4 16 10 24 10 6 24 6 -6 24 6 -10 24 10
  [4,16,10,24,10,6,24,6,-6,24,6,-10,24,10],
// 4 16 -10 24 10 -6 24 6 -6 24 -6 -10 24 -10
  [4,16,-10,24,10,-6,24,6,-6,24,-6,-10,24,-10],
// 4 16 -10 24 -10 -6 24 -6 6 24 -6 10 24 -10
  [4,16,-10,24,-10,-6,24,-6,6,24,-6,10,24,-10],
// 1 16 0 24 0 10 0 0 0 -24 0 0 0 10 box4t.dat
  [1,16,0,24,0,10,0,0,0,-24,0,0,0,10, ldraw_lib__box4t(realsolid)],
// 1 16 0 0 0 0 0 1 0 1 0 -1 0 0 stud.dat
  [1,16,0,0,0,0,0,1,0,1,0,-1,0,0, ldraw_lib__stud(realsolid)],
// 0
];
module ldraw_lib__s__3005s01(step=0, col=false, unit=2/5, alt=false, line=0.2, solid=!$preview)
    makepoly(ldraw_lib__s__3005s01(solid), step=step, col=col, unit=unit, alt=alt, line=line, solid=solid);
ldraw_lib__s__3005s01(line=0.2);
// main file
use <../lib.scad>
use <s/3005s01.scad>
$fa=1; $fs=0.2;
function ldraw_lib__3005ptt(realsolid=false) = [
// 0 Brick  1 x  1 with Blue "T" Pattern
// 0 Name: 3005ptt.dat
// 0 Author: Tore Eriksson [Tore_Eriksson]
// 0 !LDRAW_ORG Part UPDATE 2004-02
// 0 !LICENSE Licensed under CC BY 2.0 and CC BY 4.0 : see CAreadme.txt
// 
// 0 BFC CERTIFY CW
  [0,"BFC","CERTIFY"],
  [0,"BFC","CW"],
// 
// 0 !HISTORY 2003-12-09 [Steffen] BFCed, made use of existing subfile
// 0 !HISTORY 2004-04-22 [PTadmin] Official Update 2004-02
// 0 !HISTORY 2007-05-11 [PTadmin] Header formatted for Contributor Agreement
// 0 !HISTORY 2008-07-01 [PTadmin] Official Update 2008-01
// 
// 
// 1 16 0 0 0 1 0 0 0 1 0 0 0 1 s\3005s01.dat
  [1,16,0,0,0,1,0,0,0,1,0,0,0,1, ldraw_lib__s__3005s01(realsolid)],
// 
// 4 16 -10 0 -10 10 0 -10 10 5 -10 -10 5 -10
  [4,16,-10,0,-10,10,0,-10,10,5,-10,-10,5,-10],
// 4 16 -10 5 -10 -5 5 -10 -5 24 -10 -10 24 -10
  [4,16,-10,5,-10,-5,5,-10,-5,24,-10,-10,24,-10],
// 4 1 -5 5 -10 5 5 -10 5 7 -10 -5 7 -10
  [4,1,-5,5,-10,5,5,-10,5,7,-10,-5,7,-10],
// 4 16 5 5 -10 10 5 -10 10 24 -10 5 24 -10
  [4,16,5,5,-10,10,5,-10,10,24,-10,5,24,-10],
// 4 16 -5 7 -10 -1 7 -10 -1 24 -10 -5 24 -10
  [4,16,-5,7,-10,-1,7,-10,-1,24,-10,-5,24,-10],
// 4 1 -1 7 -10 1 7 -10 1 19 -10 -1 19 -10
  [4,1,-1,7,-10,1,7,-10,1,19,-10,-1,19,-10],
// 4 16 1 7 -10 5 7 -10 5 24 -10 1 24 -10
  [4,16,1,7,-10,5,7,-10,5,24,-10,1,24,-10],
// 4 16 -1 19 -10 1 19 -10 1 24 -10 -1 24 -10
  [4,16,-1,19,-10,1,19,-10,1,24,-10,-1,24,-10],
// 0
];
module ldraw_lib__3005ptt(step=0, col=false, unit=2/5, alt=false, line=0.2, solid=!$preview)
    makepoly(ldraw_lib__3005ptt(solid), step=step, col=col, unit=unit, alt=alt, line=line, solid=solid);
ldraw_lib__3005ptt(line=0.2);
